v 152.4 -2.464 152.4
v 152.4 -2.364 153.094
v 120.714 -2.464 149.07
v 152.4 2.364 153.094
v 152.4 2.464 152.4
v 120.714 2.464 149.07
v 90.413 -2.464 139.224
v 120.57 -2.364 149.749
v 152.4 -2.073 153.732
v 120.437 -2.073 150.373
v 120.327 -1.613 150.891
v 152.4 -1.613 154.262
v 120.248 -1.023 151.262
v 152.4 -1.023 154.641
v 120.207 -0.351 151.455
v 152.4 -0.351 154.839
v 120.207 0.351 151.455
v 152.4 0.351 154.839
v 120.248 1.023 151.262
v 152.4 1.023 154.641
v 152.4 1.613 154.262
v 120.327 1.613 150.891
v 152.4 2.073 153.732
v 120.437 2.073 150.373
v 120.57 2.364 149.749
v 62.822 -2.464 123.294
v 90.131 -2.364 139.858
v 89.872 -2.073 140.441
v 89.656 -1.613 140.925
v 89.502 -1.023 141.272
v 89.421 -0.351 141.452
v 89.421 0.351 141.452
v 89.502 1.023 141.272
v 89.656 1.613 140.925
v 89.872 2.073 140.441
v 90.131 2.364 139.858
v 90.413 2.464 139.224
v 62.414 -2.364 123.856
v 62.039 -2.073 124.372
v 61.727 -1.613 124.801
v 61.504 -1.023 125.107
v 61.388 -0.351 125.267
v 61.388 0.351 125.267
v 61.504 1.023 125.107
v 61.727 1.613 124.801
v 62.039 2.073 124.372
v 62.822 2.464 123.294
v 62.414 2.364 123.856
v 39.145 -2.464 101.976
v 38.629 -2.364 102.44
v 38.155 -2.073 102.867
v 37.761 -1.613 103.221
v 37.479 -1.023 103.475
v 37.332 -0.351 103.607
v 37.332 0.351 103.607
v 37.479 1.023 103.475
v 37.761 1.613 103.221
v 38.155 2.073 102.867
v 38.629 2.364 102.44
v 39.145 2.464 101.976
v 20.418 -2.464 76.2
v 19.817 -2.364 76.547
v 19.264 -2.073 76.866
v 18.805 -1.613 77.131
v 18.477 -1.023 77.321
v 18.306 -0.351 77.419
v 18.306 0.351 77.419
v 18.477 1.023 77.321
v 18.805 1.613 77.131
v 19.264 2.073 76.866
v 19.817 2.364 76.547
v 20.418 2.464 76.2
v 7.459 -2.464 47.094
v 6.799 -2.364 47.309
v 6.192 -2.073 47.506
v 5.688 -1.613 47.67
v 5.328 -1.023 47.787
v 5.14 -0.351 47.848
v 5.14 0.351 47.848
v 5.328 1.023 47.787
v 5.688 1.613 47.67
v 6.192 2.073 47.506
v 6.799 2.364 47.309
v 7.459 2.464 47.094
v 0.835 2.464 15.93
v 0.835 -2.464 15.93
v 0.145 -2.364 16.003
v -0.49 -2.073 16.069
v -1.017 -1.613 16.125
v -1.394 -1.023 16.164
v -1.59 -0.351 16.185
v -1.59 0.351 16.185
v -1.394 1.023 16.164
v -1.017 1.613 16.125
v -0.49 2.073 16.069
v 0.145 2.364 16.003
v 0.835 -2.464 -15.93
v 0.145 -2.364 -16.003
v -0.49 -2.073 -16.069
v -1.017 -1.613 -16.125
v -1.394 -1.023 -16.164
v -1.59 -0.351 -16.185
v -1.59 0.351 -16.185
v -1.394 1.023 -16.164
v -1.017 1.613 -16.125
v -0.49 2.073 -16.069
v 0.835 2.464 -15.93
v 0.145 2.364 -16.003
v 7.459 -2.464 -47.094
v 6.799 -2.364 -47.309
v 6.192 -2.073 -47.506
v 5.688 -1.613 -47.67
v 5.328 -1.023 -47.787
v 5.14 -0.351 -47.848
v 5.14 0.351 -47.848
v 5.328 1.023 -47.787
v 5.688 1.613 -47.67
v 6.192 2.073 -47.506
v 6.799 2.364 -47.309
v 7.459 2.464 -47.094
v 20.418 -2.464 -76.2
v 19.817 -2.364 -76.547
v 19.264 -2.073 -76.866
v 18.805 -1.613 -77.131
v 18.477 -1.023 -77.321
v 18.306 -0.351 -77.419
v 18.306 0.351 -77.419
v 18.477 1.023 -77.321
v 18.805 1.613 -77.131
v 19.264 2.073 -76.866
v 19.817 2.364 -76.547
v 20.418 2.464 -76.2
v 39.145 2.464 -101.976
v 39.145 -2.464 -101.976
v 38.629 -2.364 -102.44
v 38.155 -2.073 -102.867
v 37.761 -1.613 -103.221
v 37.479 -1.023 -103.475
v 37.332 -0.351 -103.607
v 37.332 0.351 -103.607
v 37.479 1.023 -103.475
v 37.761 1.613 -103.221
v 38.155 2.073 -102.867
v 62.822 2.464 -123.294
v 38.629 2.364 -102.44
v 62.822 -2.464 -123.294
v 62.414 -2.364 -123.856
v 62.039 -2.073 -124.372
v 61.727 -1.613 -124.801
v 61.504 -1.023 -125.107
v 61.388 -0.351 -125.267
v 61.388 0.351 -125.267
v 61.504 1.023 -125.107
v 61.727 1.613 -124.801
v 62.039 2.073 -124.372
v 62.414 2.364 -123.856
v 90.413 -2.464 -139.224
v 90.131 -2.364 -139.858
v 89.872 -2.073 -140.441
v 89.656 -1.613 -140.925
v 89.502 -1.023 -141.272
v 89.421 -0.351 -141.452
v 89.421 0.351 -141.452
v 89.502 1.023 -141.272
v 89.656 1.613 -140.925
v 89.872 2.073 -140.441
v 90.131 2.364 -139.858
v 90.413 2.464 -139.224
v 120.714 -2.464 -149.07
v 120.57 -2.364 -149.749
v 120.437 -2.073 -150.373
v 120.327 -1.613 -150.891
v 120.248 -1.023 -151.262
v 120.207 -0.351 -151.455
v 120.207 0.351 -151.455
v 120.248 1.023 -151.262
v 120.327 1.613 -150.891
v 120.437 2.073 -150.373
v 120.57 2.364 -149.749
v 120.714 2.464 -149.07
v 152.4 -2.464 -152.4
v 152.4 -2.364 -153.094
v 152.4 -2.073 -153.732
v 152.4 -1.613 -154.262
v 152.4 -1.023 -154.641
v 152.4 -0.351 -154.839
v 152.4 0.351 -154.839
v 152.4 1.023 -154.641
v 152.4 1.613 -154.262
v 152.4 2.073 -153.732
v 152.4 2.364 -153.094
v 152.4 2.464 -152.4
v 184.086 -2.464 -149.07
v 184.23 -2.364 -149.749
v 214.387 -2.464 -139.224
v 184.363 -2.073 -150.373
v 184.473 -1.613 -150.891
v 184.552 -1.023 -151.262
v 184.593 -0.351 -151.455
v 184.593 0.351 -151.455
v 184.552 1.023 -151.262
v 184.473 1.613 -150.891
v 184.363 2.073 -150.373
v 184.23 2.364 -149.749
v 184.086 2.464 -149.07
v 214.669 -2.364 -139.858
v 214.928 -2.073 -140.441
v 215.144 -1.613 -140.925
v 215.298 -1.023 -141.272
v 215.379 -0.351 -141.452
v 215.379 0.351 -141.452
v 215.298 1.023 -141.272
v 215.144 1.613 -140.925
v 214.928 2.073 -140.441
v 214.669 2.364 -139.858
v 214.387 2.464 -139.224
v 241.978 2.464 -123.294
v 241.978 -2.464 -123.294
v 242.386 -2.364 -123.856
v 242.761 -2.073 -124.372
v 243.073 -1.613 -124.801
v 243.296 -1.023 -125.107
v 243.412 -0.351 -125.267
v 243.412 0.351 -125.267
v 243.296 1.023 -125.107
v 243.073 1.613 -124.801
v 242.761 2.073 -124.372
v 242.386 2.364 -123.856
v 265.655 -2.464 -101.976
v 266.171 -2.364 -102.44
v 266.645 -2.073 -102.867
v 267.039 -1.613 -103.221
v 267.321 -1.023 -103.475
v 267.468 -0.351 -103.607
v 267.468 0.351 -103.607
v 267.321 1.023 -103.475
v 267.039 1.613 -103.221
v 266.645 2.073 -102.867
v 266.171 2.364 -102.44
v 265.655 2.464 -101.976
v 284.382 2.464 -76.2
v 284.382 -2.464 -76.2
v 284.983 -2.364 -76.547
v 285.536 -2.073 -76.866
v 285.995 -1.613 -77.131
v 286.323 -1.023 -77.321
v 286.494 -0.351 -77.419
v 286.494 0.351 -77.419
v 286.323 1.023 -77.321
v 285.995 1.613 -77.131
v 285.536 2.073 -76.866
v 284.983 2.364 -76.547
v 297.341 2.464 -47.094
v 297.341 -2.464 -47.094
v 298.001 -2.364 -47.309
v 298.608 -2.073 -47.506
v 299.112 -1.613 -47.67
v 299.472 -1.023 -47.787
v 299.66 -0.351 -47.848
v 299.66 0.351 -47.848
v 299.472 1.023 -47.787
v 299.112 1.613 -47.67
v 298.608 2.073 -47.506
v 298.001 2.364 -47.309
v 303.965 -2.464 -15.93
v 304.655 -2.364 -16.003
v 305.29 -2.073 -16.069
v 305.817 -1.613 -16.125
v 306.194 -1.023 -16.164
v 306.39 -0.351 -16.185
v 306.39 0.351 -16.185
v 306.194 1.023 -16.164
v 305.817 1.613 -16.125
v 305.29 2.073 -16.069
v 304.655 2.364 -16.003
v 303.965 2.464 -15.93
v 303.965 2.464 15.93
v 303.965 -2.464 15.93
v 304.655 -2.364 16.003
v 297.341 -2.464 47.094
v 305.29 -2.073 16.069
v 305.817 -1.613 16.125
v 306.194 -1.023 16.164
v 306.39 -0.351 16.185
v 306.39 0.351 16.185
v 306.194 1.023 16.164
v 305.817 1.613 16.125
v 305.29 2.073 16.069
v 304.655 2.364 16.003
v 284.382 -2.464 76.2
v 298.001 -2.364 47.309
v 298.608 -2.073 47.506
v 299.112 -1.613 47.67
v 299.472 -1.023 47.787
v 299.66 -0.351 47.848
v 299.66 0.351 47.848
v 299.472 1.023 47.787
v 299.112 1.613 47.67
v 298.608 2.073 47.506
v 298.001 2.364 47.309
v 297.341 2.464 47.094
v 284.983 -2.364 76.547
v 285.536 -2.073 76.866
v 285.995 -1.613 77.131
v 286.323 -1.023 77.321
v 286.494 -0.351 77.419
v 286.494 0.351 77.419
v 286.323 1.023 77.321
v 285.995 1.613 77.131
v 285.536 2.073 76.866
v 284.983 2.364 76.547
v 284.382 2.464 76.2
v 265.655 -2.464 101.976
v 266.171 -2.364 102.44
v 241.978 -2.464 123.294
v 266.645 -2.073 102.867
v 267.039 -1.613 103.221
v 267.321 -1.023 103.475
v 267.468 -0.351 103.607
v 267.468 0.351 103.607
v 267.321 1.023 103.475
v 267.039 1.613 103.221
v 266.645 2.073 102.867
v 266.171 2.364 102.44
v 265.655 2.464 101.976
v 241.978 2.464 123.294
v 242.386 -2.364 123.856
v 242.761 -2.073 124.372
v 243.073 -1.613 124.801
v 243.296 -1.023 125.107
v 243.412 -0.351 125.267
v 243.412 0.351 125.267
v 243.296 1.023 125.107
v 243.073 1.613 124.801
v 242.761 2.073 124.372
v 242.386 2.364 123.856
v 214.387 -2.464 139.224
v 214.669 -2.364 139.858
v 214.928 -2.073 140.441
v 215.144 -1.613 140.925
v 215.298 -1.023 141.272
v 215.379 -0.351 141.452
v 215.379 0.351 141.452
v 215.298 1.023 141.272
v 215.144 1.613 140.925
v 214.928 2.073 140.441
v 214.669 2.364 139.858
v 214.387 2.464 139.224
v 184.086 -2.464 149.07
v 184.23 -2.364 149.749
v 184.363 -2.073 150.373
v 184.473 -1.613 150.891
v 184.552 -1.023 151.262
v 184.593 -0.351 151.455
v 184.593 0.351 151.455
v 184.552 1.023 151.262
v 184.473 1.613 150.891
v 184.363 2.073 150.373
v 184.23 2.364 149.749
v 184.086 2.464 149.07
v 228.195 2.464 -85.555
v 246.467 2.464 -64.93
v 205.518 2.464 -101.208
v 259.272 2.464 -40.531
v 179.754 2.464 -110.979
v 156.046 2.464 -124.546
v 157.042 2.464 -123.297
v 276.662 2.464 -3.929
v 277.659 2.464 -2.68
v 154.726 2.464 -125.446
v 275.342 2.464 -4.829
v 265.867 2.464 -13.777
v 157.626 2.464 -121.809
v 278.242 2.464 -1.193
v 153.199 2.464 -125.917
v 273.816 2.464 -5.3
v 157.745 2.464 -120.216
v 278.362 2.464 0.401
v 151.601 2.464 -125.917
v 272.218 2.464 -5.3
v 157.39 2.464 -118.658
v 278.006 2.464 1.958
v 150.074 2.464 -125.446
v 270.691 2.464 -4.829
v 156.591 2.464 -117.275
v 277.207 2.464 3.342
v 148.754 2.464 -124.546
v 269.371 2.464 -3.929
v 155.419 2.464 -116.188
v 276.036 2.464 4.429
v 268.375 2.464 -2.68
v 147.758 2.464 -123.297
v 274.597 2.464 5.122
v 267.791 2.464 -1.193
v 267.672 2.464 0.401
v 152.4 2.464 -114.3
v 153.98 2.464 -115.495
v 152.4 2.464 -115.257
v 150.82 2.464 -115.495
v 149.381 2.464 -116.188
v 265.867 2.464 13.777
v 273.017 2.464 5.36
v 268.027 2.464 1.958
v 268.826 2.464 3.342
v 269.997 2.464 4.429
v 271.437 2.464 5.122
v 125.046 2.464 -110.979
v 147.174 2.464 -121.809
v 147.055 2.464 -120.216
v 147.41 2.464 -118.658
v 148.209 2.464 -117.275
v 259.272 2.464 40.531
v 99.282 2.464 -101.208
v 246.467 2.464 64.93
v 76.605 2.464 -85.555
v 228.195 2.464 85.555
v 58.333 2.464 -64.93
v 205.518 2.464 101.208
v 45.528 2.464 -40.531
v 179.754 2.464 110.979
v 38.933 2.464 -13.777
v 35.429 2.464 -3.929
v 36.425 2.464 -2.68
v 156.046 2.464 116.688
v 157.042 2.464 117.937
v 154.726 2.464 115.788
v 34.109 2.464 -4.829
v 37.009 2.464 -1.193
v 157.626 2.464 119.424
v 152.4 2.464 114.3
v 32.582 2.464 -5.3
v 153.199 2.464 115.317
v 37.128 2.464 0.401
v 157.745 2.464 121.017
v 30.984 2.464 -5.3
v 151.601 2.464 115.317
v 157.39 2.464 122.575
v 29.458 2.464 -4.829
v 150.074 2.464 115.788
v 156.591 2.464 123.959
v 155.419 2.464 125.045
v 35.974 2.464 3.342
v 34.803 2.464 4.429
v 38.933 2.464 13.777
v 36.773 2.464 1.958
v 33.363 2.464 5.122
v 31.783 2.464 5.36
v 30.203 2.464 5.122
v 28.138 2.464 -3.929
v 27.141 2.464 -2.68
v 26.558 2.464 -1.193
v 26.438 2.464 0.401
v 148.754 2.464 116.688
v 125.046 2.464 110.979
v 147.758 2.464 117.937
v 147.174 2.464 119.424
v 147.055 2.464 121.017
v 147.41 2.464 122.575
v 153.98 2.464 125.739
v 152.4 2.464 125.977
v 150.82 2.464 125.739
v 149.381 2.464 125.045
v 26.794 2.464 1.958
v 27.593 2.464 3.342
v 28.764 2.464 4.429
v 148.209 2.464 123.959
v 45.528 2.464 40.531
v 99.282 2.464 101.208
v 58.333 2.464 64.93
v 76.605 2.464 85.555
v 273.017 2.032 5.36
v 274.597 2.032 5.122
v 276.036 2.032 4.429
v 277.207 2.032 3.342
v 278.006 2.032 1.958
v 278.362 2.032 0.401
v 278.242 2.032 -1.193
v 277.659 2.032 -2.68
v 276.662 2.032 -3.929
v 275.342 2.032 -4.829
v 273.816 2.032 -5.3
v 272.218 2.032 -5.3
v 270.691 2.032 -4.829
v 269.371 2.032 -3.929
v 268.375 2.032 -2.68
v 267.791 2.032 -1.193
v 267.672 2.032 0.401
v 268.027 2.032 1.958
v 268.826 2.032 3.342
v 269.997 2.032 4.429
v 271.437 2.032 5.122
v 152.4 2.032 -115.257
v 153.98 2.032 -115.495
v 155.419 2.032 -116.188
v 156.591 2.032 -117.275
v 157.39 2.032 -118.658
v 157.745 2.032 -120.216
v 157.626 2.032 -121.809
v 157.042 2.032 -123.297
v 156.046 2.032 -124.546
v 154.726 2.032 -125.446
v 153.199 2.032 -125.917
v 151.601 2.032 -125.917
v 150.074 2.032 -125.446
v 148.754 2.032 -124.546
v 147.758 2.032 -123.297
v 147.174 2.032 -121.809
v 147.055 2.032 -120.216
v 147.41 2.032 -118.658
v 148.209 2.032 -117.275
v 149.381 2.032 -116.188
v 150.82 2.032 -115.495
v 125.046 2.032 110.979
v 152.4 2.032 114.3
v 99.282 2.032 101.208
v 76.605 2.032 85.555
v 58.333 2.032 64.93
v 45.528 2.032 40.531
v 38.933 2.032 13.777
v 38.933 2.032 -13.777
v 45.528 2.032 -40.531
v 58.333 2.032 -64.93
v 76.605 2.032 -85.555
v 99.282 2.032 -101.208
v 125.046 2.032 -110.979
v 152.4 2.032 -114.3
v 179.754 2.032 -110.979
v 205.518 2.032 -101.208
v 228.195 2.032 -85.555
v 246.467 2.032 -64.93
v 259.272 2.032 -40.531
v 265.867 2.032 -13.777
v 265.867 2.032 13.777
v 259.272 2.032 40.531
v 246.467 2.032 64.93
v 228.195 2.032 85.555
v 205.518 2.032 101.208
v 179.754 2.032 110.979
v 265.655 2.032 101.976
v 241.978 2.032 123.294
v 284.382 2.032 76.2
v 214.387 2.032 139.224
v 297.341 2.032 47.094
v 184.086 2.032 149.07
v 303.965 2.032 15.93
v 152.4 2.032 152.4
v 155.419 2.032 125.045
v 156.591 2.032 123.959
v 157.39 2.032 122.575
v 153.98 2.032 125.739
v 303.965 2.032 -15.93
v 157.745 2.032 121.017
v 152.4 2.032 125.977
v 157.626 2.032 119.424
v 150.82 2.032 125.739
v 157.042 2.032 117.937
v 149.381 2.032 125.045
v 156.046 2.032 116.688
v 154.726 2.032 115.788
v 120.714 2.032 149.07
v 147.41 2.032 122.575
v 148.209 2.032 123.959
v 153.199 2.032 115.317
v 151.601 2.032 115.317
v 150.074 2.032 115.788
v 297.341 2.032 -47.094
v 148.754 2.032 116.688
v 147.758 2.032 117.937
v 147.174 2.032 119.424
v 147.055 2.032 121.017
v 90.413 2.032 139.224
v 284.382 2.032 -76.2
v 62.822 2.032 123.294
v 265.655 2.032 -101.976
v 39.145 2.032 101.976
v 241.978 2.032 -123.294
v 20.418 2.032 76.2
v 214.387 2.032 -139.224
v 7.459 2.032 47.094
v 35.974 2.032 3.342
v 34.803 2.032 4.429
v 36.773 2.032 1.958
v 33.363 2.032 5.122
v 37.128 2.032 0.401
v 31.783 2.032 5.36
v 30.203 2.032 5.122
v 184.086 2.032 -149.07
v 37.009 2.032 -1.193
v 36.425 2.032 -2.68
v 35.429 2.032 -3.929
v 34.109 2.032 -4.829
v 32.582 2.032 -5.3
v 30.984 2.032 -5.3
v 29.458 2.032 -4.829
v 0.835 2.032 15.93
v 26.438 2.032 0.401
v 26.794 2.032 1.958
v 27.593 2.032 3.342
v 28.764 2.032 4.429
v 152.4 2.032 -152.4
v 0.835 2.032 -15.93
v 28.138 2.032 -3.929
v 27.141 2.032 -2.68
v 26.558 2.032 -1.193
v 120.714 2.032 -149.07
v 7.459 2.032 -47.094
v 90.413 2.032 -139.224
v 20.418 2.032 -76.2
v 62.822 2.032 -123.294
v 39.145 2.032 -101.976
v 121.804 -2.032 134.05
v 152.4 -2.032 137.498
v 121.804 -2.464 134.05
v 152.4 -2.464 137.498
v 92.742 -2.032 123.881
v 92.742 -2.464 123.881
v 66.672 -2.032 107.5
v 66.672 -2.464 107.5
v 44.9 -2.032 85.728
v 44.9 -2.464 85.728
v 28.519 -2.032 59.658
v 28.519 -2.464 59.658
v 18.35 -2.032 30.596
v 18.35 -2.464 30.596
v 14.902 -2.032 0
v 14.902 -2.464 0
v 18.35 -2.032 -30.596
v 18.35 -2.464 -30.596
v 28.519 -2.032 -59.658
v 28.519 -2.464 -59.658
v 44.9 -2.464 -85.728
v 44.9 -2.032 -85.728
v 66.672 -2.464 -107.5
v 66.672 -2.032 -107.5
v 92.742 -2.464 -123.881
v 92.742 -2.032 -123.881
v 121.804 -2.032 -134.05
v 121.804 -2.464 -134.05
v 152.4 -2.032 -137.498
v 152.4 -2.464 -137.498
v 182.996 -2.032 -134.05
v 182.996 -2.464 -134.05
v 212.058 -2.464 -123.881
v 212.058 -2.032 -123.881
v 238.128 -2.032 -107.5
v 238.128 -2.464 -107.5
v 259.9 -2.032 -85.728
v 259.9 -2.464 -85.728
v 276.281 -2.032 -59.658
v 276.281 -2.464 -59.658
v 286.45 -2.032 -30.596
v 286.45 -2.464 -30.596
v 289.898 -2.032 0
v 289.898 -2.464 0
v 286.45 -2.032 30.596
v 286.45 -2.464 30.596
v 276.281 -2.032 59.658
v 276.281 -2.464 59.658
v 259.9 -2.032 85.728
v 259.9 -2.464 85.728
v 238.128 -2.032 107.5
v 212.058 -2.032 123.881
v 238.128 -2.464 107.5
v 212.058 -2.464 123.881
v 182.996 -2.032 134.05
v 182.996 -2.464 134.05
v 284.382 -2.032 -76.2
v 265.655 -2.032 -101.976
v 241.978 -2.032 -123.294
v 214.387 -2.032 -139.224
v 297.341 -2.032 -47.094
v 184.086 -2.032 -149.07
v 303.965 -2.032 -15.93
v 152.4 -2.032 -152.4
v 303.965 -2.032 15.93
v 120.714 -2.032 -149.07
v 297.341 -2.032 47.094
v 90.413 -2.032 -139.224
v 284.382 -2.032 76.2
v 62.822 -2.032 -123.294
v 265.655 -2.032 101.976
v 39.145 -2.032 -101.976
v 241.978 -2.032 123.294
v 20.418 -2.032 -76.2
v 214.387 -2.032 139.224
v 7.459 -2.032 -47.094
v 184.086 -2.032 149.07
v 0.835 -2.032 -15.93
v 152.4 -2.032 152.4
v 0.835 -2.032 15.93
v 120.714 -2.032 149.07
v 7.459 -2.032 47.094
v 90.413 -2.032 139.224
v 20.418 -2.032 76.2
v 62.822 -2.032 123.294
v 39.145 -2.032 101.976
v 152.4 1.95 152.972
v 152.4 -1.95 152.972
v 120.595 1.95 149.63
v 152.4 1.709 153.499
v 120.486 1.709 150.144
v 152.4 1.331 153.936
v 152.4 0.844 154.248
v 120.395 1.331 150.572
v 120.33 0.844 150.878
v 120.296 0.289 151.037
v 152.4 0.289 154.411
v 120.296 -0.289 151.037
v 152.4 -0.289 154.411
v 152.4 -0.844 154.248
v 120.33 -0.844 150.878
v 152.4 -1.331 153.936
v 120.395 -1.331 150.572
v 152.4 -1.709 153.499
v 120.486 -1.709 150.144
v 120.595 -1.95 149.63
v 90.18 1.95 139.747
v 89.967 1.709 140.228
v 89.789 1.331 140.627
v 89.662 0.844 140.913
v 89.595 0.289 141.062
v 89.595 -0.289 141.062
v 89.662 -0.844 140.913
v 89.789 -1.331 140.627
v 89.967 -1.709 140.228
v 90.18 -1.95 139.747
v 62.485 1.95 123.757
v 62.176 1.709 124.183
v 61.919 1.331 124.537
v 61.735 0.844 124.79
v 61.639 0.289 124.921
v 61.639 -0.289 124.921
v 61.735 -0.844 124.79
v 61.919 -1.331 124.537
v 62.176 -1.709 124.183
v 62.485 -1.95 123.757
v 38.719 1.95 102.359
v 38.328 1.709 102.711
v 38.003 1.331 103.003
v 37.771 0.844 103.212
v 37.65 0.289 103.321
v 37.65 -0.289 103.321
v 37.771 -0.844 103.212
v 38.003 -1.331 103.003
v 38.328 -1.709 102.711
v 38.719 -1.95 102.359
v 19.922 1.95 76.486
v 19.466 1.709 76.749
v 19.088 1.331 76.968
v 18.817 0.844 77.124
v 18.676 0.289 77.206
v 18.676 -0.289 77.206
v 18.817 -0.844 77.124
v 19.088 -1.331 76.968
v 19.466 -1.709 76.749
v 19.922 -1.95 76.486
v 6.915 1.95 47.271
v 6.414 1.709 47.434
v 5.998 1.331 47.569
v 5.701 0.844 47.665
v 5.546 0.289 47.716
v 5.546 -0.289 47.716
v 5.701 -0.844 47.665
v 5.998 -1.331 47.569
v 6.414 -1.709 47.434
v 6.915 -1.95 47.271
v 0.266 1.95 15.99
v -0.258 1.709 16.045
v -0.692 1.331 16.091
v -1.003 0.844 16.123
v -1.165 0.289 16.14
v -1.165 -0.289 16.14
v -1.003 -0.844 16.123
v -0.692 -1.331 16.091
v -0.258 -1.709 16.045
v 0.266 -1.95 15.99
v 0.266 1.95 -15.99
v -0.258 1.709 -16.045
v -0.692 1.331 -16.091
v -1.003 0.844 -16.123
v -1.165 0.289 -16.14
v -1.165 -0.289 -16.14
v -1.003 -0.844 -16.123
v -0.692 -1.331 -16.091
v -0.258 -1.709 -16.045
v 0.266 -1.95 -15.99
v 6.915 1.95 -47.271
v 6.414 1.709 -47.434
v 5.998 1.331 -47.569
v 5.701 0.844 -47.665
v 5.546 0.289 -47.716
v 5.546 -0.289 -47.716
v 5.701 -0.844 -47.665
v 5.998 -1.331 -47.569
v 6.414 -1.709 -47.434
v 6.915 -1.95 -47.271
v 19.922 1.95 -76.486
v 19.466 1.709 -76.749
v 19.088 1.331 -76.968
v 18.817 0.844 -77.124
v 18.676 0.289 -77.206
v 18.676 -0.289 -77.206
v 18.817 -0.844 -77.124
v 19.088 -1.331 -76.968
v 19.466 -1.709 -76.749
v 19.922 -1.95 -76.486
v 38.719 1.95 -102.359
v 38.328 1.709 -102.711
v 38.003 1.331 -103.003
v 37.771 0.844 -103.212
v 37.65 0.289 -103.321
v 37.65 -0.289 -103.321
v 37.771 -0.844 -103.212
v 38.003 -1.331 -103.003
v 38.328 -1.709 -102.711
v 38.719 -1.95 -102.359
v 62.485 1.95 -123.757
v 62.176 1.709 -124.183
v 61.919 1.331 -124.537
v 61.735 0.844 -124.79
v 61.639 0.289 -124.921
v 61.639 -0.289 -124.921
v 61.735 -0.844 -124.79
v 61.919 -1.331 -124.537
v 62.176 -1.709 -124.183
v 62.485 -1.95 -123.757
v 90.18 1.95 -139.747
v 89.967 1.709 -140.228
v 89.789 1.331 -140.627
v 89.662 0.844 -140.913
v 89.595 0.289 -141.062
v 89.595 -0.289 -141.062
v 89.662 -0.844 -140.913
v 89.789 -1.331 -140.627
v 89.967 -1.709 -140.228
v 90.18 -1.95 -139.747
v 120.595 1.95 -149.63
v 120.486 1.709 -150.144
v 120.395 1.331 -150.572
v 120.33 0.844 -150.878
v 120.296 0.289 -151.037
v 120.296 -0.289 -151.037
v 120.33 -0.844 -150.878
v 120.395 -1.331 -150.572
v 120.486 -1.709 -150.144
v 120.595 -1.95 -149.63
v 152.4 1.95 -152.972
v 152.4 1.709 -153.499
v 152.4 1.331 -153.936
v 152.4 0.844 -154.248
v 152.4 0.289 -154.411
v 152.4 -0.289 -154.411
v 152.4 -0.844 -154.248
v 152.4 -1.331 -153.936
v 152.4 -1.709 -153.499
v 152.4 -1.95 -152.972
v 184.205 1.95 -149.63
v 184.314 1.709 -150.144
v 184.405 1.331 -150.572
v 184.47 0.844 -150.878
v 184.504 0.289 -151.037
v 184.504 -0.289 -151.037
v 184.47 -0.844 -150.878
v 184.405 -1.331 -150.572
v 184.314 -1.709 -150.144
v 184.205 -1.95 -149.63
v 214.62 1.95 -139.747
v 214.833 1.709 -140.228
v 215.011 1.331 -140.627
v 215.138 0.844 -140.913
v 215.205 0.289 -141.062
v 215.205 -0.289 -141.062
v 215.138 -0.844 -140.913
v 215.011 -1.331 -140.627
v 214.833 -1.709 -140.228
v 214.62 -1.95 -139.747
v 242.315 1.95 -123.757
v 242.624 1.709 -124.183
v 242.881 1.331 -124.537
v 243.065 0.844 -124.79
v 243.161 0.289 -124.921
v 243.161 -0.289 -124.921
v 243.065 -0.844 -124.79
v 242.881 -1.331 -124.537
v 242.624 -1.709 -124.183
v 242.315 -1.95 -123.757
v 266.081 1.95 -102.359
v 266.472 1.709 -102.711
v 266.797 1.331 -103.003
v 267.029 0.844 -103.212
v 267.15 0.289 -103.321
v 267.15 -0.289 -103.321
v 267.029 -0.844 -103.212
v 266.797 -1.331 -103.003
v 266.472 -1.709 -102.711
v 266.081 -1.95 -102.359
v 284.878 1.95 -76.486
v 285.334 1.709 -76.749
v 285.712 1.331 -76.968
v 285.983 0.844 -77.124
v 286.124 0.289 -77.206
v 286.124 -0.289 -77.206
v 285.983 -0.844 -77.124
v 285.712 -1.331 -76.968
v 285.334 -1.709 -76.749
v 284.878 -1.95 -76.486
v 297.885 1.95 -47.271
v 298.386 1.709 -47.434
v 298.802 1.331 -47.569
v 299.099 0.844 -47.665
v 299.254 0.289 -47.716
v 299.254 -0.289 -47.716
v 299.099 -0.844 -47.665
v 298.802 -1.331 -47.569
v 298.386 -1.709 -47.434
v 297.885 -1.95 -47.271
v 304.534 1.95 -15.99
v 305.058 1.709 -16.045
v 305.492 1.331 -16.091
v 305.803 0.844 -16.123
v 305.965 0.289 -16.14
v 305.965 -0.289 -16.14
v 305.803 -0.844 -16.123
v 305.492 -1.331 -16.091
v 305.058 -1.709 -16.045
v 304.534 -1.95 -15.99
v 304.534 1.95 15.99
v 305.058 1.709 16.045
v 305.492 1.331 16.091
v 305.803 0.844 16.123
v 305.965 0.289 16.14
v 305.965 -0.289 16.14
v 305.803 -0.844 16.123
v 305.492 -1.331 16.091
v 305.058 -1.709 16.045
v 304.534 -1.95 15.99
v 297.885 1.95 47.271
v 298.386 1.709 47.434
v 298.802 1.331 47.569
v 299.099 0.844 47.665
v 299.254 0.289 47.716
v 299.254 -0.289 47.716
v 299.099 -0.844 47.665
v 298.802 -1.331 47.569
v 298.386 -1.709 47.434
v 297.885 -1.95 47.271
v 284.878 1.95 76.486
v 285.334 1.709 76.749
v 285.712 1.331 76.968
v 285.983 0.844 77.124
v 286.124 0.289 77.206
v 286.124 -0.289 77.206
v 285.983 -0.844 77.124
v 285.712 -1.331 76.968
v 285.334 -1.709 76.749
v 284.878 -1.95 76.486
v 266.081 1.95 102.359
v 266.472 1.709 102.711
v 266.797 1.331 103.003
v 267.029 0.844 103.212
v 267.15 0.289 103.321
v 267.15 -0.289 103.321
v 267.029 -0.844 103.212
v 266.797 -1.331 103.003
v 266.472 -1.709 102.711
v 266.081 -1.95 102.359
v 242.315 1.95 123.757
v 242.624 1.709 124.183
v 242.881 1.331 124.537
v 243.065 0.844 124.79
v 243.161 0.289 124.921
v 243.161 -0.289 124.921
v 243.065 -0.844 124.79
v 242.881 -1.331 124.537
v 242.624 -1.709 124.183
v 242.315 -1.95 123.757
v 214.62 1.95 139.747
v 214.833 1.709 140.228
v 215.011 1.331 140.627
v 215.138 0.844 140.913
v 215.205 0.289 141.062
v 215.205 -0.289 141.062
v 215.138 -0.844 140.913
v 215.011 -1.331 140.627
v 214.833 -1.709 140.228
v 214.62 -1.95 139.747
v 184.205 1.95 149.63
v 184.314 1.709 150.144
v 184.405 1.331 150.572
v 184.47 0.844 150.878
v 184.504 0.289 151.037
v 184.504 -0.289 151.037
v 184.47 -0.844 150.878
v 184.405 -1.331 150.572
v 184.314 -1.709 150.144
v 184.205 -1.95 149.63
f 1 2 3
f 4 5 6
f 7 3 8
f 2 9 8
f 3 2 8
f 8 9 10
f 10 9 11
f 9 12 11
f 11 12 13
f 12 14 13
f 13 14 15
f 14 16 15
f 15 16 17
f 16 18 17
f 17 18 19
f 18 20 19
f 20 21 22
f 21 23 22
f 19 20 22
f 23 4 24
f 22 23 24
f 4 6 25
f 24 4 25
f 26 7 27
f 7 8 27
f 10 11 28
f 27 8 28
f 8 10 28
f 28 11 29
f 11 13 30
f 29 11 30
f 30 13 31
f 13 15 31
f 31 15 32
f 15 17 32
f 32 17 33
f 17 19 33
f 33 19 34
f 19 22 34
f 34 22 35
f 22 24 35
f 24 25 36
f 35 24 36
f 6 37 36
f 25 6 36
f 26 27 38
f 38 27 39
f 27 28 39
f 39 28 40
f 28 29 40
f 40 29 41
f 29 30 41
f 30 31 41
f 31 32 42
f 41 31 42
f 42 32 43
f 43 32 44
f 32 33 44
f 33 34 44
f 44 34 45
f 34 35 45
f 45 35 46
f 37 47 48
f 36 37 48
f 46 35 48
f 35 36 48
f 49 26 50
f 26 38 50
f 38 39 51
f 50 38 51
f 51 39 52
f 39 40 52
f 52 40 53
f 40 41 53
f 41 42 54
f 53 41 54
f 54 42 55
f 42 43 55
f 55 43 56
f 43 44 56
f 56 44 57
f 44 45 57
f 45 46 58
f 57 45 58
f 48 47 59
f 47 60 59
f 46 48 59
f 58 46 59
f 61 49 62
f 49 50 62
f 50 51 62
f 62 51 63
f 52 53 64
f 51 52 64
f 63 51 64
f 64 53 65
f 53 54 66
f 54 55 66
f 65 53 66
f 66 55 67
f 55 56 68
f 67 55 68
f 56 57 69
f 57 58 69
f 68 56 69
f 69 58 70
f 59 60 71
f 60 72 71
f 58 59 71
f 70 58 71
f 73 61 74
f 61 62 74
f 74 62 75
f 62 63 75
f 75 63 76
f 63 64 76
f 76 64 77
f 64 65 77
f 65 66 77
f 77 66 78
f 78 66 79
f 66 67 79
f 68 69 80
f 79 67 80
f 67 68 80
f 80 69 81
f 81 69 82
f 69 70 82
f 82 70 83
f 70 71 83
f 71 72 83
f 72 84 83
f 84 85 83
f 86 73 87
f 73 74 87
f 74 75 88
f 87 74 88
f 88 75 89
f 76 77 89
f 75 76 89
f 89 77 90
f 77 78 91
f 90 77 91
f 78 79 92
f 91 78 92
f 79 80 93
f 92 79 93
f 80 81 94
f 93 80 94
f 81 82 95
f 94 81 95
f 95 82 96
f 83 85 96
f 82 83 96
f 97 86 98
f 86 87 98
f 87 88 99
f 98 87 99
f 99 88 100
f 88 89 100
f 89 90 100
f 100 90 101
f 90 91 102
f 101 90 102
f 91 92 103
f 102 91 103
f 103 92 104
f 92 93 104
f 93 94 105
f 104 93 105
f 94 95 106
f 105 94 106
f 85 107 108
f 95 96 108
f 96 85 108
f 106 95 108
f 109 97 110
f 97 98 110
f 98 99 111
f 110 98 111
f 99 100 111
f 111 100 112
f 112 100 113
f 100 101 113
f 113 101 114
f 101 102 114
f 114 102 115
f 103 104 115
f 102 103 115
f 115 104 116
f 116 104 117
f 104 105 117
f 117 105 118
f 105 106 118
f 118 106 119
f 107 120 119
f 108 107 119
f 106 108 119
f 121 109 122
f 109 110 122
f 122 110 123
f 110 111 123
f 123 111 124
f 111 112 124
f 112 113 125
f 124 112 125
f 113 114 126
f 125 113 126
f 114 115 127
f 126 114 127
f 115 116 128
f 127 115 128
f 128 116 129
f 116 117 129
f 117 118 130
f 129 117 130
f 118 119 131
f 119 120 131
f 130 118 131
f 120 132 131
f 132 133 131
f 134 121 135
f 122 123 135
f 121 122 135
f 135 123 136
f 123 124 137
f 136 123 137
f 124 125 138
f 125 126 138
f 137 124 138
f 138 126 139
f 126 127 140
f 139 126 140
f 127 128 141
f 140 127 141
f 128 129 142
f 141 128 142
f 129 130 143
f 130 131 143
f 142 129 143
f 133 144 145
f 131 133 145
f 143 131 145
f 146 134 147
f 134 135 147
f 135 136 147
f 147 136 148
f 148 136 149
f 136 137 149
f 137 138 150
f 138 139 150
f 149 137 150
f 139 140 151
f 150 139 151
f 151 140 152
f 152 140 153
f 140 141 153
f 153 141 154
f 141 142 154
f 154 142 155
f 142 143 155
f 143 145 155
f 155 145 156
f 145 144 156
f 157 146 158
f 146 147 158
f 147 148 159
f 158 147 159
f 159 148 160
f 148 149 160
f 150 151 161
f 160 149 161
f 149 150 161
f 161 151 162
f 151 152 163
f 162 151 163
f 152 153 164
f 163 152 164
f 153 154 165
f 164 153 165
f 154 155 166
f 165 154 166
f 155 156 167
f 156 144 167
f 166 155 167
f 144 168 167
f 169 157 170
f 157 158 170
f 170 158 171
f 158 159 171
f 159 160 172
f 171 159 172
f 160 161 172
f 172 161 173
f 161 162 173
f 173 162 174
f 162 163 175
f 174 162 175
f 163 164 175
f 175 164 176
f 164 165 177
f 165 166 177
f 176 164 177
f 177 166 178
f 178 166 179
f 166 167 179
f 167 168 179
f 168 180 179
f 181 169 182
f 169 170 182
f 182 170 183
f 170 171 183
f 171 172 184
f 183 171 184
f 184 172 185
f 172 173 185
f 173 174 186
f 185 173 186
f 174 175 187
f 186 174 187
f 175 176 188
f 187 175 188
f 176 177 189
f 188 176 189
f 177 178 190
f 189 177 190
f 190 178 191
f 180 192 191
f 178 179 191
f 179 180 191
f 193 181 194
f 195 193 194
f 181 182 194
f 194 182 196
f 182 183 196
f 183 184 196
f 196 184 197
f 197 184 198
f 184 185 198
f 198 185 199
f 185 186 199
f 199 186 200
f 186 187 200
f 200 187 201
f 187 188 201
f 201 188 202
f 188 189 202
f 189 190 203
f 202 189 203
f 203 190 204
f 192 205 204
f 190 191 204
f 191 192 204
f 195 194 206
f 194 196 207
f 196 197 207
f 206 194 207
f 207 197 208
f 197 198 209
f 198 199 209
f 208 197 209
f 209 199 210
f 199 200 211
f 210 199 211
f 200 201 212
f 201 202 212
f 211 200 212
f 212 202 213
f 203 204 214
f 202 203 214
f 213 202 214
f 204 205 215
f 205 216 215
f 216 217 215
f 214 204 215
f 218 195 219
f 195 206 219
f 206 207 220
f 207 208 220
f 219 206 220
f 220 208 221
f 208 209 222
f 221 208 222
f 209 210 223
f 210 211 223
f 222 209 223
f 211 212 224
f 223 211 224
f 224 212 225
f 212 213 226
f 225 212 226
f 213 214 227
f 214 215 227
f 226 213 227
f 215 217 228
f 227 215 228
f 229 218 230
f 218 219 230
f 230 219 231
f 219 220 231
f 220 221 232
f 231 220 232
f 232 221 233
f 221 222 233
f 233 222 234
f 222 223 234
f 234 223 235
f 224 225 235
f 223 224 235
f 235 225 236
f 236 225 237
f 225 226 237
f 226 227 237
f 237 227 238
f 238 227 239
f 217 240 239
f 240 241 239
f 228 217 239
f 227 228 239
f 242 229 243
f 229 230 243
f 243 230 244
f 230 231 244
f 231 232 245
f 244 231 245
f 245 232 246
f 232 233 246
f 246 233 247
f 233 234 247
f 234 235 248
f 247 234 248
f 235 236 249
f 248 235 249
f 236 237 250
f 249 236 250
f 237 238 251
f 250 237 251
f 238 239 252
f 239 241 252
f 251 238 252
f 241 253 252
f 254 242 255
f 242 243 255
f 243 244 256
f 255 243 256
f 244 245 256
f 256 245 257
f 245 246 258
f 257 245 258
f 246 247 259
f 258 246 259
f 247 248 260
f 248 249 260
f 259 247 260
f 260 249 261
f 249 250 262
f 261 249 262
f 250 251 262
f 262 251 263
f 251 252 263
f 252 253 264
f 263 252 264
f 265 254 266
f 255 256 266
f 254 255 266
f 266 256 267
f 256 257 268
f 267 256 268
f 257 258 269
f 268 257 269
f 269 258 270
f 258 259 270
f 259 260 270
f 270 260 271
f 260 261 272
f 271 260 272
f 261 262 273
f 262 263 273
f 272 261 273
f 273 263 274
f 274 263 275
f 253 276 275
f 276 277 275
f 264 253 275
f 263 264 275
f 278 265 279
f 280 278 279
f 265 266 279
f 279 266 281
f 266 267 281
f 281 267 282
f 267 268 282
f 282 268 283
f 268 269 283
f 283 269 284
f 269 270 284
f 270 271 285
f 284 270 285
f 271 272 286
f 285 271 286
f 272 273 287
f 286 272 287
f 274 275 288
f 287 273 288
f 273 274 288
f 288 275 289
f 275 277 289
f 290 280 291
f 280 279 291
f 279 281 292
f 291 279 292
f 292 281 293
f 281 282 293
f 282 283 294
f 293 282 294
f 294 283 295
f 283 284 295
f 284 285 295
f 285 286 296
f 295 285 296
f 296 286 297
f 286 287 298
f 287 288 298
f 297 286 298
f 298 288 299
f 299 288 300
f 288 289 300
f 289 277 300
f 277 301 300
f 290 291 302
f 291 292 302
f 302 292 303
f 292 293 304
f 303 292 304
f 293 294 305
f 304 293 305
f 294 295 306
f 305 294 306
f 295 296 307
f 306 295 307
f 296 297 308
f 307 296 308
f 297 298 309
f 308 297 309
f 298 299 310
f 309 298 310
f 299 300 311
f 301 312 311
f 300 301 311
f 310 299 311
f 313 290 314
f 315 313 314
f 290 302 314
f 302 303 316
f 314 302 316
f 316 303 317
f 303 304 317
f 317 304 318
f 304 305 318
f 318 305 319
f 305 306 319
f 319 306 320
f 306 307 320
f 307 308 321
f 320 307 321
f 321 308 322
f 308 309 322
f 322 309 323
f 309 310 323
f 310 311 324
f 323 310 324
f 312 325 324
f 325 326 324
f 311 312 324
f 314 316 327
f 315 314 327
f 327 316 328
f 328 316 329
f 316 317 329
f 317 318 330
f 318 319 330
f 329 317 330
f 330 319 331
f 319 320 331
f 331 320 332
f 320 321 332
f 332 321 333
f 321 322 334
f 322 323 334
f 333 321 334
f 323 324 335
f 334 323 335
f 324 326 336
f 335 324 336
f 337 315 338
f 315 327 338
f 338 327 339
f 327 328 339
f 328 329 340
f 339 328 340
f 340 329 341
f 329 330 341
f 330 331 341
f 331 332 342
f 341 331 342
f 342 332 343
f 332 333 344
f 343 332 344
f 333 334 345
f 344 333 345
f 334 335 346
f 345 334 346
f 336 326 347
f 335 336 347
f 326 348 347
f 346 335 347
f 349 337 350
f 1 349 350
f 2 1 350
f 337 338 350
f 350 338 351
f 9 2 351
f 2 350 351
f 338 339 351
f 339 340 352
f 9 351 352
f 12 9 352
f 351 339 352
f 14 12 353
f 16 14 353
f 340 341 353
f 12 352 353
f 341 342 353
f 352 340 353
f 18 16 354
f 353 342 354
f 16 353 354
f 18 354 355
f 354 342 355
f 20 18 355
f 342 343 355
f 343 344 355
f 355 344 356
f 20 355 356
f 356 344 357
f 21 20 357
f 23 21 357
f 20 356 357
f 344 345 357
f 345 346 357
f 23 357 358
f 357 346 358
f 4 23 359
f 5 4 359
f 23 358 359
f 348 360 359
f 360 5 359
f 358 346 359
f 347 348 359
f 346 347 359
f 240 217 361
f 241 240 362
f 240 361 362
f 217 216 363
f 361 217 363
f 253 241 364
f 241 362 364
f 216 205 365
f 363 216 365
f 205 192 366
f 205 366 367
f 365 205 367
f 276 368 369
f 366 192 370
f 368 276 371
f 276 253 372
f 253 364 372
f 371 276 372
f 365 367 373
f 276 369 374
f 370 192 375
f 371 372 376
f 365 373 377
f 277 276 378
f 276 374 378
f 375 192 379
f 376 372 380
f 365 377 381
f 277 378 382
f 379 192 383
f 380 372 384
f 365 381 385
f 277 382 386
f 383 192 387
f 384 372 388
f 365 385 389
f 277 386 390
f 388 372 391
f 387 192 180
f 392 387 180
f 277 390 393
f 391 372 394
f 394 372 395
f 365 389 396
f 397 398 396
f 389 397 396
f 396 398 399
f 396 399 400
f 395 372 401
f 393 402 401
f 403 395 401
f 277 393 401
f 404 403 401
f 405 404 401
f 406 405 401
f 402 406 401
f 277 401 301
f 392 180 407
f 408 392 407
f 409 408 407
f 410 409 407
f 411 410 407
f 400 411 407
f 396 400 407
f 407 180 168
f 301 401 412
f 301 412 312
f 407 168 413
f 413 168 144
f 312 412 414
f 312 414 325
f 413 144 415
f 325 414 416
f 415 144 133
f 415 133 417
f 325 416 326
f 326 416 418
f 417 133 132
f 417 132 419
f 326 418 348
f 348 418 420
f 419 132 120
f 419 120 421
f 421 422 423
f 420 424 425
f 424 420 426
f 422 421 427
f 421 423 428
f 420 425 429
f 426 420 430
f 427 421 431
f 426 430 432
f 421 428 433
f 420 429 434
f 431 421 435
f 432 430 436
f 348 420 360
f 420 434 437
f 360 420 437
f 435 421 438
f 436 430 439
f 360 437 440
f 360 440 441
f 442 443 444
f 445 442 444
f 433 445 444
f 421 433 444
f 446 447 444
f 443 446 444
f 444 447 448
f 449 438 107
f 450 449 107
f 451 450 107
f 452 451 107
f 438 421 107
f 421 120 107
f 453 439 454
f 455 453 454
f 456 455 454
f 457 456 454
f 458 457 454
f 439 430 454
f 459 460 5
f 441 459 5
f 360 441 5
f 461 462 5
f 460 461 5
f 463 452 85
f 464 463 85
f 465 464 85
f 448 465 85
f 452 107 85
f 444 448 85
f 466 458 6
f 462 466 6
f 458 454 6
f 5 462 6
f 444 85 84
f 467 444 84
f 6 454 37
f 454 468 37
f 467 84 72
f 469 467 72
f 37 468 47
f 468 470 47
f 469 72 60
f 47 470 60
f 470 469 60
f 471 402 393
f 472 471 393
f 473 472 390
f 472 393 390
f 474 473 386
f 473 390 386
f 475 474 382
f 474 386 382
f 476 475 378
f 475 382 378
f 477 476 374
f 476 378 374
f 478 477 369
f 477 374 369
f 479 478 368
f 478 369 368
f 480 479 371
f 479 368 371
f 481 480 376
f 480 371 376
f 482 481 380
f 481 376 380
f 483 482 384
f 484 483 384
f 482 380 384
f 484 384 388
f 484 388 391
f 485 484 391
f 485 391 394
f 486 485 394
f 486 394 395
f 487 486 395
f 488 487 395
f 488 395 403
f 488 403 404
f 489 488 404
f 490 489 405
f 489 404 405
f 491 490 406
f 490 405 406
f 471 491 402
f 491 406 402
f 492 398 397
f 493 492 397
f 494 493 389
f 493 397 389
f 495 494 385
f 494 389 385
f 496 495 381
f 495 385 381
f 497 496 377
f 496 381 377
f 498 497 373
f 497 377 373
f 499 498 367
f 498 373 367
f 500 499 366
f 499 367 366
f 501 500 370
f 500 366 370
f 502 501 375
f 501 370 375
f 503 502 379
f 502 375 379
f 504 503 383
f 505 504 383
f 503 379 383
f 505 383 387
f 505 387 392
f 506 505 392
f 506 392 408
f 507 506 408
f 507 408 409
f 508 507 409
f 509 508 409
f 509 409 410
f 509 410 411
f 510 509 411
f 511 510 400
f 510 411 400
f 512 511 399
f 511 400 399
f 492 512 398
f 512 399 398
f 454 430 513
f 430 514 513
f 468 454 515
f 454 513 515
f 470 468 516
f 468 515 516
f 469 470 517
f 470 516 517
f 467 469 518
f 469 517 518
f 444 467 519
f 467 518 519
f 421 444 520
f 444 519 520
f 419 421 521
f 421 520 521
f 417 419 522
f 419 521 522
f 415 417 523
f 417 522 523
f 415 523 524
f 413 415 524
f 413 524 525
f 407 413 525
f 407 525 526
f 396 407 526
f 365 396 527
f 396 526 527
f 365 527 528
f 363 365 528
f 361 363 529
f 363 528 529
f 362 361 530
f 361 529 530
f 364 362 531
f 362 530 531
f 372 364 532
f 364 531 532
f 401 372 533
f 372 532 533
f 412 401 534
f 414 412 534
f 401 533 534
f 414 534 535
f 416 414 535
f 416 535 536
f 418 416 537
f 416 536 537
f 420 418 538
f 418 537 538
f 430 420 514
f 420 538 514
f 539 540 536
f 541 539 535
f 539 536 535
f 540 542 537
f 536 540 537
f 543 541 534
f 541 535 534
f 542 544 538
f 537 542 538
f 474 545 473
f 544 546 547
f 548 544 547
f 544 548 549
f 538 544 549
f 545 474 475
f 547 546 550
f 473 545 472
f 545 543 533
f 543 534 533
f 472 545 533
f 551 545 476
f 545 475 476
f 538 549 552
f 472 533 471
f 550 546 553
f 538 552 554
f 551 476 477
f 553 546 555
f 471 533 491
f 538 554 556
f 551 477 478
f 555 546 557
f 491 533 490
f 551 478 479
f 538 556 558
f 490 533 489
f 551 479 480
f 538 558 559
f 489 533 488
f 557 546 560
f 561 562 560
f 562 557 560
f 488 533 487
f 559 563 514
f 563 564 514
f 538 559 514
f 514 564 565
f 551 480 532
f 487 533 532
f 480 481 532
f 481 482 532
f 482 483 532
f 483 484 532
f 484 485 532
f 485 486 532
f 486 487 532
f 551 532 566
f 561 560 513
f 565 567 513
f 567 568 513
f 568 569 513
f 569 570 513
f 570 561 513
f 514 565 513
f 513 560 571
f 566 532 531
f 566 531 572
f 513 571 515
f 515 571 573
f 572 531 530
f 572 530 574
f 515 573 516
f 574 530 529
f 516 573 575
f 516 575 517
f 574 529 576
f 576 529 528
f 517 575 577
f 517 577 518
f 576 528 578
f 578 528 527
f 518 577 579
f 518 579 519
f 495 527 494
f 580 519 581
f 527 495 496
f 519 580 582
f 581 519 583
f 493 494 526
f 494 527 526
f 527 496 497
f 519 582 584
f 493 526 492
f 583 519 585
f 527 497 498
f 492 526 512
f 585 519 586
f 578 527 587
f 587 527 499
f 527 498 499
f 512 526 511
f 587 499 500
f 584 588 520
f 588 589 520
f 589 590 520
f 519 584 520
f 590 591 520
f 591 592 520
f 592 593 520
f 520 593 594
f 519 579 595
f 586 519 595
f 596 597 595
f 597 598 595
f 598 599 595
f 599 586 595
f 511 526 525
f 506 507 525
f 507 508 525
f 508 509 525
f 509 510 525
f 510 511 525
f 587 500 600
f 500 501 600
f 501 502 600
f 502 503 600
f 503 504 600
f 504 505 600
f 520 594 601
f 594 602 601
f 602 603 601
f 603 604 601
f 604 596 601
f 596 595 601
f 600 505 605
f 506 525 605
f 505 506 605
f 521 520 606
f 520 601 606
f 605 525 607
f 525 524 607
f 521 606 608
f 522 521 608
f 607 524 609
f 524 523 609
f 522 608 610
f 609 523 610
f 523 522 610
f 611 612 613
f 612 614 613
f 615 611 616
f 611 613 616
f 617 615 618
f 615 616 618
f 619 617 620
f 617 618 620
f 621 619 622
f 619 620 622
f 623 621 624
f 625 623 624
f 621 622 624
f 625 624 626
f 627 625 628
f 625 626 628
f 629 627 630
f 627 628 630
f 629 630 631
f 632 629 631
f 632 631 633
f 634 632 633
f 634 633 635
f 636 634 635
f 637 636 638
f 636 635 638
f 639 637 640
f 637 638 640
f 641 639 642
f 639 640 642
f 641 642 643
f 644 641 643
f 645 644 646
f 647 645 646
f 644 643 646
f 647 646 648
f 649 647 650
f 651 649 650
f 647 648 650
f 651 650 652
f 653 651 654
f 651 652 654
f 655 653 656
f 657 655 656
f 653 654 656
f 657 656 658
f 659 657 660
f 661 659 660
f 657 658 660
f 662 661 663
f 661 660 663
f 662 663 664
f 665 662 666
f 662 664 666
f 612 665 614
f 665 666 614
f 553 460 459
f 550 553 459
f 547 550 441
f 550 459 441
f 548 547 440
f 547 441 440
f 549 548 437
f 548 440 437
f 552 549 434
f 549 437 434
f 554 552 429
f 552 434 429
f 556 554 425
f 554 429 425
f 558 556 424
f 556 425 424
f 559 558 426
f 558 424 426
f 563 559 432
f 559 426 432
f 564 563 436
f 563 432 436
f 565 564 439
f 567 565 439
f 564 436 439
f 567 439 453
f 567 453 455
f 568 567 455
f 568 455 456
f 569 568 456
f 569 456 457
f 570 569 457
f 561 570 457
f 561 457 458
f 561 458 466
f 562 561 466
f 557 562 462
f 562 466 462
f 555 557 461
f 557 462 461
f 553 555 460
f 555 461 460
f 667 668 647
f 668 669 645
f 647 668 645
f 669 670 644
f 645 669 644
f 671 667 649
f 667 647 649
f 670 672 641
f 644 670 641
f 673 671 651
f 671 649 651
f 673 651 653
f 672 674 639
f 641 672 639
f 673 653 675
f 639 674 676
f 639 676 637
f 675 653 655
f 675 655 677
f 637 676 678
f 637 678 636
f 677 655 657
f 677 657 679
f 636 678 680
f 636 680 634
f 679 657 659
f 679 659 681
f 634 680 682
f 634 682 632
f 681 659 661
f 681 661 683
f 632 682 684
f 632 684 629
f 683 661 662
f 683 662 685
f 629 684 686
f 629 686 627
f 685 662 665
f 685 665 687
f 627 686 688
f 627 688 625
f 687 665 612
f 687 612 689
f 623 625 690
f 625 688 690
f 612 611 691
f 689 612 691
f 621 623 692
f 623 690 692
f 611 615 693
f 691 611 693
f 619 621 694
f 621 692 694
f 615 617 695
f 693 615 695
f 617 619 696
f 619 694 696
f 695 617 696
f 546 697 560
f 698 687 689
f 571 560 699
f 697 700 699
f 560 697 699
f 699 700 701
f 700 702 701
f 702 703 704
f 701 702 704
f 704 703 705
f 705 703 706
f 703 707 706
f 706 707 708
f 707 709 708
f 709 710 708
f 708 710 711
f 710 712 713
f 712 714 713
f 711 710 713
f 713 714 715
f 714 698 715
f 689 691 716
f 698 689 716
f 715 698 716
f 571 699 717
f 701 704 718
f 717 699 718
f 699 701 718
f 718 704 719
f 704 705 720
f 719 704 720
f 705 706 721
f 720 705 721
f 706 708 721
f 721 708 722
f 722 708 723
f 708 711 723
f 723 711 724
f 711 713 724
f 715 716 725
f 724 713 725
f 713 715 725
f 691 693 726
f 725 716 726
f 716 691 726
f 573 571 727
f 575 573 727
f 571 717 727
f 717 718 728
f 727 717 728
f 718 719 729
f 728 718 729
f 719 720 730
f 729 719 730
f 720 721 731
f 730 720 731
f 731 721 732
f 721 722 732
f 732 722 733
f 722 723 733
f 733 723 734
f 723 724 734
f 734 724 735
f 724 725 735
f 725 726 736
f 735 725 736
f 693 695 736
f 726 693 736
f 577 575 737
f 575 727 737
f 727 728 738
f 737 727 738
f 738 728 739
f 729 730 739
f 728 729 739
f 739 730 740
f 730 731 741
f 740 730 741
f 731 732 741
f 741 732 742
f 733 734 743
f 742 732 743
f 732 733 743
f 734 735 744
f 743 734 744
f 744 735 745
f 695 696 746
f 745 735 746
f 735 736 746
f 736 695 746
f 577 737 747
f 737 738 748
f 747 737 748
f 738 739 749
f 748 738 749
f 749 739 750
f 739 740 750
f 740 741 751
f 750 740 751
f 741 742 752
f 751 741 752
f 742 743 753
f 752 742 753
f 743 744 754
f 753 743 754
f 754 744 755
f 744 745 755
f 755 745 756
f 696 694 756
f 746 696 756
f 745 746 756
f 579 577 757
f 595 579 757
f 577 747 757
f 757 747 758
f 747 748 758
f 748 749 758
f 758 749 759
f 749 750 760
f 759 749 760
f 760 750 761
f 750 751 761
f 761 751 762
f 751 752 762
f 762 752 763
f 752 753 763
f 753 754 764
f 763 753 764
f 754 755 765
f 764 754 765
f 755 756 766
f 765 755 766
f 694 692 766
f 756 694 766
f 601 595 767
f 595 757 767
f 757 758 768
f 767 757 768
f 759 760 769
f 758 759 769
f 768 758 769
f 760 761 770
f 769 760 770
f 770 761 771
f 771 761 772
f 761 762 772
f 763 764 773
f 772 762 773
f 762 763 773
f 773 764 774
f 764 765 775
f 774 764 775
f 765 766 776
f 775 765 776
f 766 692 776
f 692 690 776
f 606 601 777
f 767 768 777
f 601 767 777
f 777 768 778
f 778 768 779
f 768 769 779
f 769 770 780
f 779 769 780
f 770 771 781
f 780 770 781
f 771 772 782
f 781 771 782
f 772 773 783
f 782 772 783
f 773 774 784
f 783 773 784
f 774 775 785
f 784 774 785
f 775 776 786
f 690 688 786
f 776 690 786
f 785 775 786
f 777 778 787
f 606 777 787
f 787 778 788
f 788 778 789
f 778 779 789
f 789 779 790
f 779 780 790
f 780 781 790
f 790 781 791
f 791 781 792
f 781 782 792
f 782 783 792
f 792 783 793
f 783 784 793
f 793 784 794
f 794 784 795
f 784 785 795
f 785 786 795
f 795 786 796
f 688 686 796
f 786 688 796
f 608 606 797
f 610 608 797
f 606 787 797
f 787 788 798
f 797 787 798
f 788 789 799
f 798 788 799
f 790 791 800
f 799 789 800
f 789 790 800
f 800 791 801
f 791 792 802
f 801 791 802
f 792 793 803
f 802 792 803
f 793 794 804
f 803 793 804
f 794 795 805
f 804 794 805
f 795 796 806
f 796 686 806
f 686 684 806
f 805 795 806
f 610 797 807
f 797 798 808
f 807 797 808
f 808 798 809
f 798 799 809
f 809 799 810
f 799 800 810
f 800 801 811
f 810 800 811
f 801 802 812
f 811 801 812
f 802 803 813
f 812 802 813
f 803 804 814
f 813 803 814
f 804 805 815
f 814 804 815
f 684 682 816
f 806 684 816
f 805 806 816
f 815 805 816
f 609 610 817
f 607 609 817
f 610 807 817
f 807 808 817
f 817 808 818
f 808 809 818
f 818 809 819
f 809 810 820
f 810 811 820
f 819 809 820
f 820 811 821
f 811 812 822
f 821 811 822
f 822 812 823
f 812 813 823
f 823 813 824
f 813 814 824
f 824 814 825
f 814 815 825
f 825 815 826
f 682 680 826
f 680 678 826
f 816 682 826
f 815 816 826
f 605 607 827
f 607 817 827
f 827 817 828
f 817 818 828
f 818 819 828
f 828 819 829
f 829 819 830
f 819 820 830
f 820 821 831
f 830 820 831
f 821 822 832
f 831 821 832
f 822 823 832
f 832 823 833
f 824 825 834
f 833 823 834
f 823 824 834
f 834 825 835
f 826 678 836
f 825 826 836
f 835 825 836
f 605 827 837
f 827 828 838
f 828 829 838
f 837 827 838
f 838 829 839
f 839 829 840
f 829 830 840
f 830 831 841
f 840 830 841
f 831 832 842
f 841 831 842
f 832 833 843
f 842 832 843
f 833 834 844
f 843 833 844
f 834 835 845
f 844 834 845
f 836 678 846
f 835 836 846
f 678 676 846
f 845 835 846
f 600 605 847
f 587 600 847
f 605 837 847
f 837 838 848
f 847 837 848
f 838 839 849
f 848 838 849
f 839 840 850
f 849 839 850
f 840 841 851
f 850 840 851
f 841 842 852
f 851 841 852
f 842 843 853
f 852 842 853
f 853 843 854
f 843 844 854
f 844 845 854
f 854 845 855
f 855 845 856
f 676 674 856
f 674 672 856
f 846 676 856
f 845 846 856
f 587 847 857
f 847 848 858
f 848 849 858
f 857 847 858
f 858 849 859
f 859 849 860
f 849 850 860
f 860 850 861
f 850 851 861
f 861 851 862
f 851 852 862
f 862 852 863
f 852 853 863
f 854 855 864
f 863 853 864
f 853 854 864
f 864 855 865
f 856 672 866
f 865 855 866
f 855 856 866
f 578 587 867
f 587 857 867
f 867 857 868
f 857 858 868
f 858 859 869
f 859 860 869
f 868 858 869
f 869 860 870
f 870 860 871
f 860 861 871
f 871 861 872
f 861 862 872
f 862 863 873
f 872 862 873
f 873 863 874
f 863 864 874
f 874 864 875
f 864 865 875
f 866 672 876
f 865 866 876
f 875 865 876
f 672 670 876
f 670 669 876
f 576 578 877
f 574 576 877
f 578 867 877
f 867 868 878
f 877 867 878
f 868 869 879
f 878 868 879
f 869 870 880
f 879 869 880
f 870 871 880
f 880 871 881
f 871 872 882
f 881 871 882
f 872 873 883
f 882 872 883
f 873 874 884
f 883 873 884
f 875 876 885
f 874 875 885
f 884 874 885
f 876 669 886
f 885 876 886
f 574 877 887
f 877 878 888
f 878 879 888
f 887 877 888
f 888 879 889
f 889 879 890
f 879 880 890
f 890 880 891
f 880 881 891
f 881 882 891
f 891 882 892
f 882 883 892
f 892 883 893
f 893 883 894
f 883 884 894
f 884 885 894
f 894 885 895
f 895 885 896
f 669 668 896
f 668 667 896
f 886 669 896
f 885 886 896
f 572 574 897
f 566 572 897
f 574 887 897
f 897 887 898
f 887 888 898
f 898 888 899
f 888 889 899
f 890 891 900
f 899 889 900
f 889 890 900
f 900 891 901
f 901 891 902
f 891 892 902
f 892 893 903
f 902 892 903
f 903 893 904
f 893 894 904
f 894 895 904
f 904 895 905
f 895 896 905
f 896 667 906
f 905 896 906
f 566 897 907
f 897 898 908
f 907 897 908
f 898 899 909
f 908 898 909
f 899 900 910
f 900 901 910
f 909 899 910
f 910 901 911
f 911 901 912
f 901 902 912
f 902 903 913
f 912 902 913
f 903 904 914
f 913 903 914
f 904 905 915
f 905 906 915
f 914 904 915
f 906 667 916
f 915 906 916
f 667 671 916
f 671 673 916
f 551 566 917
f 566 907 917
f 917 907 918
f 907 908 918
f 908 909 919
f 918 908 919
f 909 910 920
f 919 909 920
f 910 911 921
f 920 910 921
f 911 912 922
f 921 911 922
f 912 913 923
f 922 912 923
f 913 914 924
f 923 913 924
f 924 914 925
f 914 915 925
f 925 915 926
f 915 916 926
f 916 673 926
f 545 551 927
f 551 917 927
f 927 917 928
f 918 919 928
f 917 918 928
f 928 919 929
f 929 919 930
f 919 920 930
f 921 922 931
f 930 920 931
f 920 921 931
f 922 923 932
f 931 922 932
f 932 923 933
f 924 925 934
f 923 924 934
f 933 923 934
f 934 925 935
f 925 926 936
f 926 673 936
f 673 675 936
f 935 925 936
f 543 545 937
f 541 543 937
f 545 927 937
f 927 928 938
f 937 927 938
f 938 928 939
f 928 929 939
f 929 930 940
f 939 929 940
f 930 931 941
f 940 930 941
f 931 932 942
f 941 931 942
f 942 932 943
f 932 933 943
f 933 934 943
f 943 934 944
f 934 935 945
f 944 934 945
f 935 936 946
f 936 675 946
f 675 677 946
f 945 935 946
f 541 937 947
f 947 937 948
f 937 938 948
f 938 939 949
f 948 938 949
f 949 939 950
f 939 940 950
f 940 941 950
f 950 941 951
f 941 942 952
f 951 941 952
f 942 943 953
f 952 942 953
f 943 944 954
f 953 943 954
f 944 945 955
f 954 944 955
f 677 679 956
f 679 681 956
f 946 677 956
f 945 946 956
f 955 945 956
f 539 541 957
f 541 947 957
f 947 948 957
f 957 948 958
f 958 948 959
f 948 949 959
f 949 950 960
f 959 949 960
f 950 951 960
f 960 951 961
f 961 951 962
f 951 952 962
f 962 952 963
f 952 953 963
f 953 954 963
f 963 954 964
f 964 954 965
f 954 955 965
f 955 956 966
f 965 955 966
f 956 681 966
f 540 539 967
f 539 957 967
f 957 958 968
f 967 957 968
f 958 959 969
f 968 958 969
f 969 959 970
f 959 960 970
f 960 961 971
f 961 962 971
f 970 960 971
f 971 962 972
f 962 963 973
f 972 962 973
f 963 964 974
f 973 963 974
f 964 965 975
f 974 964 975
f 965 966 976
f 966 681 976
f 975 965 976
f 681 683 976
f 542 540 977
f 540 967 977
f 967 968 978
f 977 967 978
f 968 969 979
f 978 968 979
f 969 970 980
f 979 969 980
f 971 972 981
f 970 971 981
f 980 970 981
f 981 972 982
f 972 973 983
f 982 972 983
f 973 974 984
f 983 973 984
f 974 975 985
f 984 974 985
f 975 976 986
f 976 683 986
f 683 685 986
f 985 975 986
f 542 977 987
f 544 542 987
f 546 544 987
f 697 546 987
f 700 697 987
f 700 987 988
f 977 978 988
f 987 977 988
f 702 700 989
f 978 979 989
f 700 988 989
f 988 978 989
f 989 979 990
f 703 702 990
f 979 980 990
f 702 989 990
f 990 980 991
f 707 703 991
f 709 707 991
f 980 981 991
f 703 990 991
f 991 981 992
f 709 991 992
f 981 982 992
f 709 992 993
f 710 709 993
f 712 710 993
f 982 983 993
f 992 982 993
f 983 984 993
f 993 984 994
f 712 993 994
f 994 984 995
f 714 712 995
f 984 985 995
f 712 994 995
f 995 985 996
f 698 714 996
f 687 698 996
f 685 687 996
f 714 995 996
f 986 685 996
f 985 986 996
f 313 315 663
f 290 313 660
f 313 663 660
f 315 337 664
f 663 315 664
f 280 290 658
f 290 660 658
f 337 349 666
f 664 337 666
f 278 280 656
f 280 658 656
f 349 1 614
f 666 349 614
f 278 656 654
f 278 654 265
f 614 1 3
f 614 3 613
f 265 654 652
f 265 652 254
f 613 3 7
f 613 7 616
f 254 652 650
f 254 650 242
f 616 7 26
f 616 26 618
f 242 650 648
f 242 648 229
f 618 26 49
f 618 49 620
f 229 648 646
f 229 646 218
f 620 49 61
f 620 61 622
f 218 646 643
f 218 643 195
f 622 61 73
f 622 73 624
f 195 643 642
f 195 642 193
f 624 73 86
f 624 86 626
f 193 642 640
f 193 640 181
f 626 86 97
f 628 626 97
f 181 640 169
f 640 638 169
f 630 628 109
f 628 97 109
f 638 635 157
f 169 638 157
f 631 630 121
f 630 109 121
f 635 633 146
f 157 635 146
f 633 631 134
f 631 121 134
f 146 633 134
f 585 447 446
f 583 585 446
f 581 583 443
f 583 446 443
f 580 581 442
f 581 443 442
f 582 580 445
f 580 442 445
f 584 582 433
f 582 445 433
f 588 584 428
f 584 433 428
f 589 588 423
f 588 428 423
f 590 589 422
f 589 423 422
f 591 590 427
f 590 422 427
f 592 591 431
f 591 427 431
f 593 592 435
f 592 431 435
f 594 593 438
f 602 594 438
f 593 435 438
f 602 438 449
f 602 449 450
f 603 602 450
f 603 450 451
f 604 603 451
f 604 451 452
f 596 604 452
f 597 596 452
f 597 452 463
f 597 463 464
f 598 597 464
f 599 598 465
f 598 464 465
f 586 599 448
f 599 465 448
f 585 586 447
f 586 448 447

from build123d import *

# Parameters (mm, degrees)
SKETCH3_R          = 5.360033356
CUT_EXTRUDE1_DEPTH = 0.4318


with BuildPart() as part:
    # Sketch2 → Revolve1 (revolve)
    with BuildSketch(Plane.XY, mode=Mode.PRIVATE) as revolve1_sk:
        with BuildLine():
            Line((0, 2.4638), (38.1, 2.4638))
            Line((38.1, 2.4638), (38.1, 2.032))
            Line((38.1, 2.032), (0, 2.032))
            ThreePointArc((0, 2.032), (-2.032, 0), (0, -2.032))
            Line((0, -2.032), (14.902441519, -2.032))
            Line((14.902441519, -2.032), (14.902441519, -2.4638))
            Line((14.902441519, -2.4638), (0, -2.4638))
            ThreePointArc((0, -2.4638), (-2.4638, 0), (0, 2.4638))
        make_face()
    revolve(revolve1_sk.sketch.rotate(Axis((152.4, 15.515798555, 0), (0, -1, 0)), 270), axis=Axis((152.4, 15.515798555, 0), (0, -1, 0)))

    # Sketch3 → Cut-Extrude1 (cut)
    with BuildSketch(Plane(origin=(0, 2.4638, 0), x_dir=(1, 0, 0), z_dir=(0, 1, 0))):
        with Locations(Location((31.78326852, 0, 0), (0, 0, 270))):
            Circle(SKETCH3_R)
        with Locations(Location((152.4, 120.61673148, 0), (0, 0, 270))):
            Circle(SKETCH3_R)
        with Locations(Location((273.01673148, 0, 0), (0, 0, 270))):
            Circle(SKETCH3_R)
        with Locations(Location((152.4, -120.61673148, 0), (0, 0, 270))):
            Circle(SKETCH3_R)
    extrude(amount=-CUT_EXTRUDE1_DEPTH, mode=Mode.SUBTRACT)


solid = part.part
